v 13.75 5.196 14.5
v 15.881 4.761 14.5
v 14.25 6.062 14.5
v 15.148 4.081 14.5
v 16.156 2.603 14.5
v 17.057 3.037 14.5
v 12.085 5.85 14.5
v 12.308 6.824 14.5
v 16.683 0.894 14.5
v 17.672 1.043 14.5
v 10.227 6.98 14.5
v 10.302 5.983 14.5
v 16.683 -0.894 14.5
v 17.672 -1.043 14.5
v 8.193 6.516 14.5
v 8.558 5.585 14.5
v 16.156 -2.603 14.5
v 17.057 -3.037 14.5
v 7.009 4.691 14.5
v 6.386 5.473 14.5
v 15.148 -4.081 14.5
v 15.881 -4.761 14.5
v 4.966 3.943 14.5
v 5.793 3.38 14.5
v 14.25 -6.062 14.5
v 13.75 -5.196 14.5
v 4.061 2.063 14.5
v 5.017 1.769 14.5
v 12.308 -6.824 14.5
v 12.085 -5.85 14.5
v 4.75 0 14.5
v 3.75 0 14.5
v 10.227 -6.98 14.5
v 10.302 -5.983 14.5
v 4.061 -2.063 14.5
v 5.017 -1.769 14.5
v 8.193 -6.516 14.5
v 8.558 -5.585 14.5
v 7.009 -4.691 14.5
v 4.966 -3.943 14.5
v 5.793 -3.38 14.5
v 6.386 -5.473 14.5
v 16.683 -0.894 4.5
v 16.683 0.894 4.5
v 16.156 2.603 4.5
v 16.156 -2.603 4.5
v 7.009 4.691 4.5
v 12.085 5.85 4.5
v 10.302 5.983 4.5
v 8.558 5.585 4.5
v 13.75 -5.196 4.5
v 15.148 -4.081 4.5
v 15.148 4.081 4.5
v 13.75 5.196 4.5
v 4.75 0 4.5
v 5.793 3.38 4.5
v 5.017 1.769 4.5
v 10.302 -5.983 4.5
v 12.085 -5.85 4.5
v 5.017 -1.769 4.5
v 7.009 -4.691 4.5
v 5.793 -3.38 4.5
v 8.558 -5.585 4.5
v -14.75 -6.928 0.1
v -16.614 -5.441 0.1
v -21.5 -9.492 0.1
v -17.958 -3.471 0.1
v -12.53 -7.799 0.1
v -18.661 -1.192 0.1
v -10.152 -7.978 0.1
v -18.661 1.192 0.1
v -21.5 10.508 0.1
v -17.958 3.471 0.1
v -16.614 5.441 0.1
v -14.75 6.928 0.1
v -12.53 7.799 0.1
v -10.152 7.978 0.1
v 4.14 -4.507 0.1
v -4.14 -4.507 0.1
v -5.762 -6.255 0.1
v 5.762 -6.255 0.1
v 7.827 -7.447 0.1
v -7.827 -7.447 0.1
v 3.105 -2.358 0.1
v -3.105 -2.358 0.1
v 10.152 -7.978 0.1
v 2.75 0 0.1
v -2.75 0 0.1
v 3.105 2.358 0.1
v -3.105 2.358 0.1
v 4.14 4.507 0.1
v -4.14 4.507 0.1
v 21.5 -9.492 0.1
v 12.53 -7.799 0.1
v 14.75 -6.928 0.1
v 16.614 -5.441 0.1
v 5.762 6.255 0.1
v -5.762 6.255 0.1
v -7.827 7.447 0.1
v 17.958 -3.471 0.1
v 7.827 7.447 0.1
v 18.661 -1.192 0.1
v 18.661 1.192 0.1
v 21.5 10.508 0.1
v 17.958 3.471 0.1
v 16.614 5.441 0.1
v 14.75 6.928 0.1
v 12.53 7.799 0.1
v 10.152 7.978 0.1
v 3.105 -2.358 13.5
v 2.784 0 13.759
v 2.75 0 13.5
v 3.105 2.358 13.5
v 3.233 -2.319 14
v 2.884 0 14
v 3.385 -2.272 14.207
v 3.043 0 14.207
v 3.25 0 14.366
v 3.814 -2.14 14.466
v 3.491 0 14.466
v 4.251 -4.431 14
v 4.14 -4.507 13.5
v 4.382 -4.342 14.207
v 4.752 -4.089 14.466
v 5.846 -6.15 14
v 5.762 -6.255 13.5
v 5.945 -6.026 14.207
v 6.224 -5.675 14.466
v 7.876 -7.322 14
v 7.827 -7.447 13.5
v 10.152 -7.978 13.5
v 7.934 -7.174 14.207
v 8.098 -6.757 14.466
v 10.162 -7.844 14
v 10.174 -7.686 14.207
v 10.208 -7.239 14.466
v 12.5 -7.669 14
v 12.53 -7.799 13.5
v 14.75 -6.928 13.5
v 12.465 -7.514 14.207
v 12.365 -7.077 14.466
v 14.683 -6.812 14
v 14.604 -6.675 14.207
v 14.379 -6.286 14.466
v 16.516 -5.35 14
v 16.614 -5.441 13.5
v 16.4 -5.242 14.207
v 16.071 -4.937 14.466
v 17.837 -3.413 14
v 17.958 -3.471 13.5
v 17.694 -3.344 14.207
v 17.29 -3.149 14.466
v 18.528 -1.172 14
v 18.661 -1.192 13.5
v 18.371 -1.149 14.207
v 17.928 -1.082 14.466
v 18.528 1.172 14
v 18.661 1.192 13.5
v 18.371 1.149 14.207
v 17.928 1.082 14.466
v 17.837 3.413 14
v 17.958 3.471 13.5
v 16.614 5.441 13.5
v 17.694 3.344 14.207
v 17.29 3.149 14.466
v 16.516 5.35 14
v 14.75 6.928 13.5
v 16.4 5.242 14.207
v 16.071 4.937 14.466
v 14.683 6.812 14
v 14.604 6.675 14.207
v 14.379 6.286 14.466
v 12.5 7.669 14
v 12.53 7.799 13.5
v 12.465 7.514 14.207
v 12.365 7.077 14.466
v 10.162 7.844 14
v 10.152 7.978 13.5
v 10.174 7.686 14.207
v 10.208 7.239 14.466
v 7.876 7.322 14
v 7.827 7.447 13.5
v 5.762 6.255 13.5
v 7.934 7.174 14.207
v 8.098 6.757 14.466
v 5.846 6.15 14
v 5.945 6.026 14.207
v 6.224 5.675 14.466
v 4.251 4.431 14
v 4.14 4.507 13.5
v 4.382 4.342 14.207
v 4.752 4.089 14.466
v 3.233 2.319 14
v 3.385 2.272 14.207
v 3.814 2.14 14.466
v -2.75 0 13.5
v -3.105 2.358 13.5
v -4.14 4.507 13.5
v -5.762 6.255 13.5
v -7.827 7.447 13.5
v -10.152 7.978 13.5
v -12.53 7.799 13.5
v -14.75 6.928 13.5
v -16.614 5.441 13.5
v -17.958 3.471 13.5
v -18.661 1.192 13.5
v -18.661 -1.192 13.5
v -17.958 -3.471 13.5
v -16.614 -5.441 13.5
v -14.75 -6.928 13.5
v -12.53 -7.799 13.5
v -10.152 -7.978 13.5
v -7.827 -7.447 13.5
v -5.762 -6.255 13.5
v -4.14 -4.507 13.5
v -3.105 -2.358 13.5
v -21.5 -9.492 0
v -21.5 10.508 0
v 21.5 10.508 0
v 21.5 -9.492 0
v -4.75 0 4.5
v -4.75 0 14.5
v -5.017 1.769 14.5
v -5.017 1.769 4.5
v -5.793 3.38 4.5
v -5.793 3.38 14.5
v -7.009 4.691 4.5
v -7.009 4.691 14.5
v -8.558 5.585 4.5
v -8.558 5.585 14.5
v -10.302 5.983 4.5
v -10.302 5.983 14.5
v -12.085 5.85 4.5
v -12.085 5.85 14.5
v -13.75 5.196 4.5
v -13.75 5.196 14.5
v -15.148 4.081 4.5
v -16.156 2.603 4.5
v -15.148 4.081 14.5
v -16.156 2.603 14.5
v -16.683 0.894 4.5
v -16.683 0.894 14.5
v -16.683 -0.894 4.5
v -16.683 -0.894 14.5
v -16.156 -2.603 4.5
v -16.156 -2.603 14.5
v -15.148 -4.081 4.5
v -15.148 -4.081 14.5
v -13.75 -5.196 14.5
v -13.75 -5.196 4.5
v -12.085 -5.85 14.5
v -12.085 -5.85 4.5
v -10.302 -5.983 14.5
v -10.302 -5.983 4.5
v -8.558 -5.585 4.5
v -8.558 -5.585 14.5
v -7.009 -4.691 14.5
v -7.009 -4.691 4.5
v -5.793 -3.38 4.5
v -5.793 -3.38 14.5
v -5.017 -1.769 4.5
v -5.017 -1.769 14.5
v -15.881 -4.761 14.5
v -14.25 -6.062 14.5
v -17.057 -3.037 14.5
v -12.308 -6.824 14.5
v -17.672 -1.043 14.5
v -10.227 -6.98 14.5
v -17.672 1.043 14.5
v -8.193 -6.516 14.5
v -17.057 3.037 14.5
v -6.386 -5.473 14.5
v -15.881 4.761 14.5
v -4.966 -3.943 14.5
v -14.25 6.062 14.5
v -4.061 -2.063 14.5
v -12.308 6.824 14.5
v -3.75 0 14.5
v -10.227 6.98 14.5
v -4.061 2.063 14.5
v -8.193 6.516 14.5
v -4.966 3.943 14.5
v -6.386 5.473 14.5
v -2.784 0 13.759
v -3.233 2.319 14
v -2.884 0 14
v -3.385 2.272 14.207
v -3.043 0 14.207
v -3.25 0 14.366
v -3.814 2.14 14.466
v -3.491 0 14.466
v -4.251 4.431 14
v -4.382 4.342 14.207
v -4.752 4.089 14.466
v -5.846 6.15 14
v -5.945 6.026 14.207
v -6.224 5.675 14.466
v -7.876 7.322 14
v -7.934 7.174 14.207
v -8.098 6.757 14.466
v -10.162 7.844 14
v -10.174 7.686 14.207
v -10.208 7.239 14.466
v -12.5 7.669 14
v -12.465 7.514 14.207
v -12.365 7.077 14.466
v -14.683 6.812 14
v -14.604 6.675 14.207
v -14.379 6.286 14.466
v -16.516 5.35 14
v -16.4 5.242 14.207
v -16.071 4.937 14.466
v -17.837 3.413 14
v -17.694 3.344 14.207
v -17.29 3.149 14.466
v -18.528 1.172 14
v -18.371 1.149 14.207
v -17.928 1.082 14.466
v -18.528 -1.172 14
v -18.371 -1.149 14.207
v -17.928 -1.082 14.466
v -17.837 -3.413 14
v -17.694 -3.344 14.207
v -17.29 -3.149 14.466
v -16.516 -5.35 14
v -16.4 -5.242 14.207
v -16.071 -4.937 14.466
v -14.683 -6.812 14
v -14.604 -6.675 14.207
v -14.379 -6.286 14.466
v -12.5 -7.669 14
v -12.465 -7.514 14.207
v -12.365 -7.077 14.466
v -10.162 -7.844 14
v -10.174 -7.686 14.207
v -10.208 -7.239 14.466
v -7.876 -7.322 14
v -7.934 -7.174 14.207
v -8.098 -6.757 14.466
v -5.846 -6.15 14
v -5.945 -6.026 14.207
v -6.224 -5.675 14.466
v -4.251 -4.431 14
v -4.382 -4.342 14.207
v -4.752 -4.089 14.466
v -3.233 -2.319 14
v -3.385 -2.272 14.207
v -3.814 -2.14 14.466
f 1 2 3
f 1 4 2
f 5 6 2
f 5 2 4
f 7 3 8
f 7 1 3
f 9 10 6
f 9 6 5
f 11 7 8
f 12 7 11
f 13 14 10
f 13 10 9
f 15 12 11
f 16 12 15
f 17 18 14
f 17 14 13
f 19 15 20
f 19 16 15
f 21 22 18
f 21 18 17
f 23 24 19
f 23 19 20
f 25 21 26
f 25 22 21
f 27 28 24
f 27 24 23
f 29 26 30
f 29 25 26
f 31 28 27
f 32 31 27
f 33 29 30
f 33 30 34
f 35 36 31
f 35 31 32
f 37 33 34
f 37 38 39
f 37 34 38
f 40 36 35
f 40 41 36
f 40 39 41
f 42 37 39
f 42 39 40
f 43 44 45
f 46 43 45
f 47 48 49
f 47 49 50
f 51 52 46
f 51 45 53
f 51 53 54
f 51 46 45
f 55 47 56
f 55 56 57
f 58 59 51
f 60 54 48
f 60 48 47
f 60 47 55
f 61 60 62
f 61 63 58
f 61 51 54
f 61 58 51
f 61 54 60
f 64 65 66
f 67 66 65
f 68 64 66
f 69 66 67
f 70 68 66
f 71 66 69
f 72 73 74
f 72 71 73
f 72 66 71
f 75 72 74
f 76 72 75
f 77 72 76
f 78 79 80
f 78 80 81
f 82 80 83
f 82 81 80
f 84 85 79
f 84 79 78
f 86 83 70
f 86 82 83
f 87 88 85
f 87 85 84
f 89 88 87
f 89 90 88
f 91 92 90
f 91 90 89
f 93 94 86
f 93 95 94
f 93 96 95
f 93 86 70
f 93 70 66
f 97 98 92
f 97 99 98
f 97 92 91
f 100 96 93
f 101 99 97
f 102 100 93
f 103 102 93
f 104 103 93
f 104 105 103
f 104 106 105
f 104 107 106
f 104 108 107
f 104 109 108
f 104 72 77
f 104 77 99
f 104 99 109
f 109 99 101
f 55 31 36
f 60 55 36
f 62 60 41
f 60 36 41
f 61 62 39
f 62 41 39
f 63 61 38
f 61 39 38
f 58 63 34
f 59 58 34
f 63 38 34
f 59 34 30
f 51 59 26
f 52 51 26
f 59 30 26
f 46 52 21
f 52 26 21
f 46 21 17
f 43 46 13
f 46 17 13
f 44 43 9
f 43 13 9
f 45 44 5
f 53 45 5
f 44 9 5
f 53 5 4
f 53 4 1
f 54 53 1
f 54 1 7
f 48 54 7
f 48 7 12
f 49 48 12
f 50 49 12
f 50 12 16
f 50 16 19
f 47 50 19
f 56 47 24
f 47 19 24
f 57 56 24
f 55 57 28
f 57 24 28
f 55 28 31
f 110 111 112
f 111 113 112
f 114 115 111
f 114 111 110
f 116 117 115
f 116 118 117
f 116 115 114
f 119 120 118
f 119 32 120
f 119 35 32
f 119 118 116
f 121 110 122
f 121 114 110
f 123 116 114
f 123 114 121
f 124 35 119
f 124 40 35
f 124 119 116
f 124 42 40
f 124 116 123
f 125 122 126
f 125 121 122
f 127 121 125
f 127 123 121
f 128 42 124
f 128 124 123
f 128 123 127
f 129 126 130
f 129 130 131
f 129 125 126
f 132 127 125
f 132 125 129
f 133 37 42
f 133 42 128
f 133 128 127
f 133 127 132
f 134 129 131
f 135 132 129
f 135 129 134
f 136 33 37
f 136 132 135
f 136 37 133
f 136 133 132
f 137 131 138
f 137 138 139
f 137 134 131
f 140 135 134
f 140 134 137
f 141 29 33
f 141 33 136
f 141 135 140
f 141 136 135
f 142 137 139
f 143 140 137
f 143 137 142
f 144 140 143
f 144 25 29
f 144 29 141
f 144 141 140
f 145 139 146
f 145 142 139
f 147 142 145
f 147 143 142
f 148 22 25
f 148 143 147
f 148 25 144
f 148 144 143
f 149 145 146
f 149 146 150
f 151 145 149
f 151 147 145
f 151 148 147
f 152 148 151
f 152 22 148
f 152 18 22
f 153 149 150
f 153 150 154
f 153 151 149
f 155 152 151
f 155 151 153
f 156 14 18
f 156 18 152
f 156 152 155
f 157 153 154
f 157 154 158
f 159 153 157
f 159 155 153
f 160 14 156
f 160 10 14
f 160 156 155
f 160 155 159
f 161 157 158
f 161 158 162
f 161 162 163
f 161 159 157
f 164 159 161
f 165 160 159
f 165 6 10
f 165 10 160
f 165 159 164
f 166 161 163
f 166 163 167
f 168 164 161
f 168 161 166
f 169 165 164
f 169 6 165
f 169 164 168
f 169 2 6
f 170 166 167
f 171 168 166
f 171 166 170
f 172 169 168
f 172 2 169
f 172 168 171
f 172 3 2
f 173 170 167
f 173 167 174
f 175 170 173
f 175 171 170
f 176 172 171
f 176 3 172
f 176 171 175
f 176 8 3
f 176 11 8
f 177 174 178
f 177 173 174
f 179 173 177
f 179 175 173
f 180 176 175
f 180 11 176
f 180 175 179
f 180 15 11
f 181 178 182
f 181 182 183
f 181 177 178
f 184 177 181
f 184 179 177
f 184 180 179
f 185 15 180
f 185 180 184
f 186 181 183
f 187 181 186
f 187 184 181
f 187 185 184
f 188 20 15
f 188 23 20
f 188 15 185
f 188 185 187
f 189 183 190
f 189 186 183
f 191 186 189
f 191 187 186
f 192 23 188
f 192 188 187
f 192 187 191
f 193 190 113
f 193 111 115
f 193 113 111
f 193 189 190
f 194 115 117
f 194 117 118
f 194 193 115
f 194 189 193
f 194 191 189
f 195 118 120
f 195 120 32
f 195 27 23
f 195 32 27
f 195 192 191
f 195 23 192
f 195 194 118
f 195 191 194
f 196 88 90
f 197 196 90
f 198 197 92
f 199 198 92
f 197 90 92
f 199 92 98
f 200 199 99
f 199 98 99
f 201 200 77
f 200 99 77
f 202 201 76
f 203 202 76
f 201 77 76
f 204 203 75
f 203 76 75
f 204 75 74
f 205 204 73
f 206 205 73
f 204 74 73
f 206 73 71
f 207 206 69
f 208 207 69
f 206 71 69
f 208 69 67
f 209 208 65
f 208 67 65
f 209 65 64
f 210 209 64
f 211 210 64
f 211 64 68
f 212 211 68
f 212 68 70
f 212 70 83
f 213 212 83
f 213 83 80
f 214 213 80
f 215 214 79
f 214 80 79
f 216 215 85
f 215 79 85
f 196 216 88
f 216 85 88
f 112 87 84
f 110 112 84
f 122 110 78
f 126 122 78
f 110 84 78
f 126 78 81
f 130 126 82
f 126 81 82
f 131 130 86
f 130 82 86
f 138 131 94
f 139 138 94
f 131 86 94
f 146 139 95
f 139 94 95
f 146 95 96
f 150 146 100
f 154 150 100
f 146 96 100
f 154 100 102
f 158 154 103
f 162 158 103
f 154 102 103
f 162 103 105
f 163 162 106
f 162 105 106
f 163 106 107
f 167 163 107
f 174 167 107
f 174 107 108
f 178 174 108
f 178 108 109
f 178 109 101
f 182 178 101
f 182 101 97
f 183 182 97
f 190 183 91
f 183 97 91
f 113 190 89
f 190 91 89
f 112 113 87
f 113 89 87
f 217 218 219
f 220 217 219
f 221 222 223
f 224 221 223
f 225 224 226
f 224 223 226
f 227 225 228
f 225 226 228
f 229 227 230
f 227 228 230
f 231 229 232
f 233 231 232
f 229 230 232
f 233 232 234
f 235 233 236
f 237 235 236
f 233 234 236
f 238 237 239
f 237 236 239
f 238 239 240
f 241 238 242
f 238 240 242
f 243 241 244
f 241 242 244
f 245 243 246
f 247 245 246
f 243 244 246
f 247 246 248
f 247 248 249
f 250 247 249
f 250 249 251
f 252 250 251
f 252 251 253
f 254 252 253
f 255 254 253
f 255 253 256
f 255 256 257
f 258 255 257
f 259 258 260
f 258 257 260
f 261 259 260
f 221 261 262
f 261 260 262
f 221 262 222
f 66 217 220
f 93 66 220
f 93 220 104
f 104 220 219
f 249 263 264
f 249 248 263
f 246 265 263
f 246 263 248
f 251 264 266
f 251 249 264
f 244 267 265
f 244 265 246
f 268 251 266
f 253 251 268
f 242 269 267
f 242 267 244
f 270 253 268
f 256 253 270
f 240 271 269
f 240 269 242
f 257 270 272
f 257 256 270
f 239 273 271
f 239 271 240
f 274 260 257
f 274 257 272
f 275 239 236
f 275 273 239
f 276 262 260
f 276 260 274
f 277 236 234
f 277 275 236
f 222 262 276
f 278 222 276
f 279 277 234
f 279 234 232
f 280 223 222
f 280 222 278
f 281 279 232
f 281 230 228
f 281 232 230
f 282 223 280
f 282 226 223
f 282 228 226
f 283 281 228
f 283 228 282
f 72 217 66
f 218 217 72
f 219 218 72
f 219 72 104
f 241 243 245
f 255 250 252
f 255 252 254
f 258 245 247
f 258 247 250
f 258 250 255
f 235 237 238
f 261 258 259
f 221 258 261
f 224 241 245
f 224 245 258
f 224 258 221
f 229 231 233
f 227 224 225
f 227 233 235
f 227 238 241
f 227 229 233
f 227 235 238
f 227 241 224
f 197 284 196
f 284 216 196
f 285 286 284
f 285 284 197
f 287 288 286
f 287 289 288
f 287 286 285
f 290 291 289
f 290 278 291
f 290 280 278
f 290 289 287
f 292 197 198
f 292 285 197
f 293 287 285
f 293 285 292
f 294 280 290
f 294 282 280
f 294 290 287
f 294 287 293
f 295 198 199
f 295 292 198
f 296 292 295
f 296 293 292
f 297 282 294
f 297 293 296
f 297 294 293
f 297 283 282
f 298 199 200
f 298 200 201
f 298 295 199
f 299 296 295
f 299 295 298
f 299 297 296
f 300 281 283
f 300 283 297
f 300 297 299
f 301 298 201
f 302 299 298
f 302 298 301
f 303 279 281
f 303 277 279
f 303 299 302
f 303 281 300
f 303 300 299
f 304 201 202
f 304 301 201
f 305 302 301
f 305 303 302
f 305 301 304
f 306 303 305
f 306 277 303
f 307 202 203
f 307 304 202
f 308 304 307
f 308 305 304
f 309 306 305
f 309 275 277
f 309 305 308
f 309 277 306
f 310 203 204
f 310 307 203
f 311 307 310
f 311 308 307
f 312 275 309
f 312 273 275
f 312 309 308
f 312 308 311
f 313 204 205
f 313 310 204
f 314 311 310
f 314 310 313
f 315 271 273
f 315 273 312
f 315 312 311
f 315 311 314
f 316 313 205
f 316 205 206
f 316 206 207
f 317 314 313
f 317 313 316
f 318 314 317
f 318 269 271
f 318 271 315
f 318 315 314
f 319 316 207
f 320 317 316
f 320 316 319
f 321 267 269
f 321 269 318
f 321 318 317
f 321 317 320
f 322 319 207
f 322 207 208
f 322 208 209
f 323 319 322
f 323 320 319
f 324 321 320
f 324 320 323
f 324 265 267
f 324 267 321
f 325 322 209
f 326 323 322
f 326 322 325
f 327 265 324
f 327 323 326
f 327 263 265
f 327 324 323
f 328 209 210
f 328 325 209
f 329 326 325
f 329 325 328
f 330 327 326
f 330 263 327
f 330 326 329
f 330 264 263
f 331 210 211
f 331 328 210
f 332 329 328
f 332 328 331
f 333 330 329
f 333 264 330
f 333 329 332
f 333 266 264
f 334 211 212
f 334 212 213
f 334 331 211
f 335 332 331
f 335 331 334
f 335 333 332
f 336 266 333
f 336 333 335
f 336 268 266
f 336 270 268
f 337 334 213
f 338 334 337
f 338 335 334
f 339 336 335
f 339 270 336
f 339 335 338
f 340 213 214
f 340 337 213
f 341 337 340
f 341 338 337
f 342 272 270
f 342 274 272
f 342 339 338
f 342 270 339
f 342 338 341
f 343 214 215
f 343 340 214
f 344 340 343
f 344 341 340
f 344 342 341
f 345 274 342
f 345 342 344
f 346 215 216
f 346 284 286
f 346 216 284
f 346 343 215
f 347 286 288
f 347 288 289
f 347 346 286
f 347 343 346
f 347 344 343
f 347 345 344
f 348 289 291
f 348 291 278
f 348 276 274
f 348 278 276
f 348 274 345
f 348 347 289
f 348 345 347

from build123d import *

# Parameters (mm, degrees)
SKETCH1_W           = 43
SKETCH1_H           = 20
BOSS_EXTRUDE1_DEPTH = 0.1
SKETCH3_R           = 8
BOSS_EXTRUDE2_DEPTH = 14.4
FILLET1_R           = 1
SKETCH5_R           = 6
CUT_EXTRUDE1_DEPTH  = 10


with BuildPart() as part:
    # Sketch1 → Boss-Extrude1 (new body)
    with BuildSketch(Plane.XY):
        with Locations((0, 0.508181818)):
            Rectangle(SKETCH1_W, SKETCH1_H)
    extrude(amount=BOSS_EXTRUDE1_DEPTH)

    # Sketch3 → Boss-Extrude2 (add)
    with BuildSketch(Plane.XY.offset(0.1)):
        with Locations((-10.75, 0)):
            Circle(SKETCH3_R)
        with Locations(Location((10.75, 0, 0), (0, 0, 180))):
            Circle(SKETCH3_R)
    extrude(amount=BOSS_EXTRUDE2_DEPTH)

    # Fillet1
    fillet1_edges = [part.edges().sort_by_distance(p)[0] for p in [
        (-18.75, 0, 14.5),
        (18.75, 0, 14.5),
    ]]
    fillet(fillet1_edges, radius=FILLET1_R)

    # Sketch5 → Cut-Extrude1 (cut)
    with BuildSketch(Plane.XY.offset(14.5)):
        with Locations((-10.75, 0)):
            Circle(SKETCH5_R)
        with Locations(Location((10.75, 0, 0), (0, 0, 180))):
            Circle(SKETCH5_R)
    extrude(amount=-CUT_EXTRUDE1_DEPTH, mode=Mode.SUBTRACT)


solid = part.part
